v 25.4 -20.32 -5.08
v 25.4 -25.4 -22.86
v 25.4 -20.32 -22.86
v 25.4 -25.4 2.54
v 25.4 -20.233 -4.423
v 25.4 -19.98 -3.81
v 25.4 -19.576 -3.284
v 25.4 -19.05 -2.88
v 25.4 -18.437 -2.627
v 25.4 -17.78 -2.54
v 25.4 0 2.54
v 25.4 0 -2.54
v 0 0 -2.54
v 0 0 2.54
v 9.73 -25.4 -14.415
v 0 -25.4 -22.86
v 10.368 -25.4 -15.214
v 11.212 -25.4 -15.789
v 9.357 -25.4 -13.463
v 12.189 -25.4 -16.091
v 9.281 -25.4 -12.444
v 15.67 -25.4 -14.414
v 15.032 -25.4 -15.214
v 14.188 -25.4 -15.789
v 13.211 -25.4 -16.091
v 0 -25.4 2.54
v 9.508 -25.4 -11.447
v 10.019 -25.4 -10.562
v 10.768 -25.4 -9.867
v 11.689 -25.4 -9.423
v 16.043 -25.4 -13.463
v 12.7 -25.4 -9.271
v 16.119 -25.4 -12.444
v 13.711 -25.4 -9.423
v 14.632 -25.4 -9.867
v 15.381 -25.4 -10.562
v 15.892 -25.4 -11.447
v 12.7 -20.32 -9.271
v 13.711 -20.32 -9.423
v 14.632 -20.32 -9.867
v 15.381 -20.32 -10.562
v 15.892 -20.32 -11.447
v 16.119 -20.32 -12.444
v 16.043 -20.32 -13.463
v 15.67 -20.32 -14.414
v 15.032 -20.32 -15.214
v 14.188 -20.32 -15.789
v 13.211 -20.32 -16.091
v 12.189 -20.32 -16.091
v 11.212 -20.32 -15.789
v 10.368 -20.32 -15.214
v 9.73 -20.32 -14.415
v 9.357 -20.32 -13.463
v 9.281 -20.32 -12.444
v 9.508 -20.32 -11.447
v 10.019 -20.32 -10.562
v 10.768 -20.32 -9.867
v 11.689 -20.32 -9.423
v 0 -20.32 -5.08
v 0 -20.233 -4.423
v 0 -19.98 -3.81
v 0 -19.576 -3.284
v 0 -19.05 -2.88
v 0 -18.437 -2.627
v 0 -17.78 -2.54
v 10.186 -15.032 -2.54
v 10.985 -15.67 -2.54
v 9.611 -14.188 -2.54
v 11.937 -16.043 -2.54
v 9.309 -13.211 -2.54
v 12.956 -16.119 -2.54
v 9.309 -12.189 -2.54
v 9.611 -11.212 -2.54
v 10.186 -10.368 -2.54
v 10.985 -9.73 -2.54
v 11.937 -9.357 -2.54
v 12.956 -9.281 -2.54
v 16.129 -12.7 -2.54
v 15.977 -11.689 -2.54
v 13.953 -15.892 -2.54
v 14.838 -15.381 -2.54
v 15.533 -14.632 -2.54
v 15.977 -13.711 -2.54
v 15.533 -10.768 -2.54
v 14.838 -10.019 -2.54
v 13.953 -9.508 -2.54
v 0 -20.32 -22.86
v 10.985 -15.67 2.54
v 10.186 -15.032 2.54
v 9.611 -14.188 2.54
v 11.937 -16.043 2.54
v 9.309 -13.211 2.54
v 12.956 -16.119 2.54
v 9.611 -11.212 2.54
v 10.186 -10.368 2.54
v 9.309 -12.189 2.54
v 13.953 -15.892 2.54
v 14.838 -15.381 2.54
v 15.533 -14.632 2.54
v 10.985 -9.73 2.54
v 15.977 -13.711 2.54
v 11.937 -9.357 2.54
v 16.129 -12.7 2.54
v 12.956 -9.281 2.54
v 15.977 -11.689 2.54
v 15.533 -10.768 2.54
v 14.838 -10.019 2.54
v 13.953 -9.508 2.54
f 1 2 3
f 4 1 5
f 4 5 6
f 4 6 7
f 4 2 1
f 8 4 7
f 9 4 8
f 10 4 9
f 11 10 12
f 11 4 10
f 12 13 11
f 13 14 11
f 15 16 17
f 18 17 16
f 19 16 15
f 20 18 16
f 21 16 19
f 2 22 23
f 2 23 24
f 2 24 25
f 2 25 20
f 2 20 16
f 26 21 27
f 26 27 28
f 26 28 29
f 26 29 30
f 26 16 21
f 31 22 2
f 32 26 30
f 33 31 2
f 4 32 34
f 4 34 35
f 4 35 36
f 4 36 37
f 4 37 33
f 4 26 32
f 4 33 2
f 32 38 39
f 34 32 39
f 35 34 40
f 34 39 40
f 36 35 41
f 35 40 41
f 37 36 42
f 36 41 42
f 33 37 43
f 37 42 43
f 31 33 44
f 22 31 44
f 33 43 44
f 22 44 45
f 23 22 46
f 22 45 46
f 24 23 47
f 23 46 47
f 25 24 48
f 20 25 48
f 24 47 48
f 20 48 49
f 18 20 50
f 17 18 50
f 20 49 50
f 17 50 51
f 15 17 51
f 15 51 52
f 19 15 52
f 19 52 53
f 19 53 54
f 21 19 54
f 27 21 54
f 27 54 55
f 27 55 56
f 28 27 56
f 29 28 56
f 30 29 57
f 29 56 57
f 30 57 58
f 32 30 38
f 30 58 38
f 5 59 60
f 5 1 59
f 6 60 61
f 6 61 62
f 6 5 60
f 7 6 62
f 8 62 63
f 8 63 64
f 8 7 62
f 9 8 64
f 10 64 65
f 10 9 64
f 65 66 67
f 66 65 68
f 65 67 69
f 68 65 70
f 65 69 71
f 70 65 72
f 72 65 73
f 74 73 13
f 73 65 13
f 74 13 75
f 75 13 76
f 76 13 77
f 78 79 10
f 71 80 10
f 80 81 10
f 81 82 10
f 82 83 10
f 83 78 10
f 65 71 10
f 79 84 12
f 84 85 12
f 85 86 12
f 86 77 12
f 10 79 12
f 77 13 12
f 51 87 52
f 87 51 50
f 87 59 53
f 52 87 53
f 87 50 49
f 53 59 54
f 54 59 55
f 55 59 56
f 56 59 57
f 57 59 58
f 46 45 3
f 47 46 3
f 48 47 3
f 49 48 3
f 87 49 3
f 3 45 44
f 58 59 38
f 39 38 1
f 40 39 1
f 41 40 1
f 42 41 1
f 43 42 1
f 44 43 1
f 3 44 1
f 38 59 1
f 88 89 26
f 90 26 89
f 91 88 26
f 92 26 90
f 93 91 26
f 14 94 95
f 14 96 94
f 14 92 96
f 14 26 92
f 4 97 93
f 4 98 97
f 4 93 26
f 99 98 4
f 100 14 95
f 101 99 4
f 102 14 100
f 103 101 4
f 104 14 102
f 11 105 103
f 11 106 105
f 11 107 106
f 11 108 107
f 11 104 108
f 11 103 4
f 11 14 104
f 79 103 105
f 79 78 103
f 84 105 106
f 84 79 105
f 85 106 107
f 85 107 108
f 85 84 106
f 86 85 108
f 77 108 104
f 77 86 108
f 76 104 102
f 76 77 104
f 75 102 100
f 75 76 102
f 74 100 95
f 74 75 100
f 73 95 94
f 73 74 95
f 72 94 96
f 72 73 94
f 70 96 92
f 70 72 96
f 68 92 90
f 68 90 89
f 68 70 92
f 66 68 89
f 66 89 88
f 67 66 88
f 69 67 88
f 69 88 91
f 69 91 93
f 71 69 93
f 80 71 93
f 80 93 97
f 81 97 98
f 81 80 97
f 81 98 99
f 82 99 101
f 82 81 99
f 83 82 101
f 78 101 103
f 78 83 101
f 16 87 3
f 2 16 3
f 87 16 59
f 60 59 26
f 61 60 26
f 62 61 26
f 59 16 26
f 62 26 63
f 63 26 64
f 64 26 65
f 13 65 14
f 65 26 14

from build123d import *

# Parameters (mm, degrees)
SKETCH1_W           = 25.4
SKETCH1_H           = 25.4
SKETCH1_R           = 3.429
BOSS_EXTRUDE1_DEPTH = 2.54
SKETCH3_W           = 25.4
SKETCH3_H           = 5.08
BOSS_EXTRUDE2_DEPTH = 25.4
SKETCH4_R           = 3.429
CUT_EXTRUDE1_DEPTH  = 5.08
FILLET1_R           = 2.54


with BuildPart() as part:
    # Sketch1 → Boss-Extrude1 (new, symmetric)
    with BuildSketch(Plane.XY):
        with Locations((12.7, -12.7)):
            Rectangle(SKETCH1_W, SKETCH1_H)
        with Locations((12.7, -12.7)):
            Circle(SKETCH1_R, mode=Mode.SUBTRACT)
    extrude(amount=BOSS_EXTRUDE1_DEPTH, both=True)

    # Sketch3 → Boss-Extrude2 (add)
    with BuildSketch(Plane.XY.offset(2.54)):
        with Locations((12.7, -22.86)):
            Rectangle(SKETCH3_W, SKETCH3_H)
    extrude(amount=-BOSS_EXTRUDE2_DEPTH)

    # Sketch4 → Cut-Extrude1 (cut)
    with BuildSketch(Plane(origin=(0, -20.32, 0), x_dir=(1, 0, 0), z_dir=(0, 1, 0))):
        with Locations(Location((12.7, 12.7, 0), (0, 0, 270))):
            Circle(SKETCH4_R)
    extrude(amount=-CUT_EXTRUDE1_DEPTH, mode=Mode.SUBTRACT)

    # Fillet1
    fillet1_edges = [part.edges().sort_by_distance(p)[0] for p in [
        (12.7, -20.32, -2.54),
    ]]
    fillet(fillet1_edges, radius=FILLET1_R)


solid = part.part
